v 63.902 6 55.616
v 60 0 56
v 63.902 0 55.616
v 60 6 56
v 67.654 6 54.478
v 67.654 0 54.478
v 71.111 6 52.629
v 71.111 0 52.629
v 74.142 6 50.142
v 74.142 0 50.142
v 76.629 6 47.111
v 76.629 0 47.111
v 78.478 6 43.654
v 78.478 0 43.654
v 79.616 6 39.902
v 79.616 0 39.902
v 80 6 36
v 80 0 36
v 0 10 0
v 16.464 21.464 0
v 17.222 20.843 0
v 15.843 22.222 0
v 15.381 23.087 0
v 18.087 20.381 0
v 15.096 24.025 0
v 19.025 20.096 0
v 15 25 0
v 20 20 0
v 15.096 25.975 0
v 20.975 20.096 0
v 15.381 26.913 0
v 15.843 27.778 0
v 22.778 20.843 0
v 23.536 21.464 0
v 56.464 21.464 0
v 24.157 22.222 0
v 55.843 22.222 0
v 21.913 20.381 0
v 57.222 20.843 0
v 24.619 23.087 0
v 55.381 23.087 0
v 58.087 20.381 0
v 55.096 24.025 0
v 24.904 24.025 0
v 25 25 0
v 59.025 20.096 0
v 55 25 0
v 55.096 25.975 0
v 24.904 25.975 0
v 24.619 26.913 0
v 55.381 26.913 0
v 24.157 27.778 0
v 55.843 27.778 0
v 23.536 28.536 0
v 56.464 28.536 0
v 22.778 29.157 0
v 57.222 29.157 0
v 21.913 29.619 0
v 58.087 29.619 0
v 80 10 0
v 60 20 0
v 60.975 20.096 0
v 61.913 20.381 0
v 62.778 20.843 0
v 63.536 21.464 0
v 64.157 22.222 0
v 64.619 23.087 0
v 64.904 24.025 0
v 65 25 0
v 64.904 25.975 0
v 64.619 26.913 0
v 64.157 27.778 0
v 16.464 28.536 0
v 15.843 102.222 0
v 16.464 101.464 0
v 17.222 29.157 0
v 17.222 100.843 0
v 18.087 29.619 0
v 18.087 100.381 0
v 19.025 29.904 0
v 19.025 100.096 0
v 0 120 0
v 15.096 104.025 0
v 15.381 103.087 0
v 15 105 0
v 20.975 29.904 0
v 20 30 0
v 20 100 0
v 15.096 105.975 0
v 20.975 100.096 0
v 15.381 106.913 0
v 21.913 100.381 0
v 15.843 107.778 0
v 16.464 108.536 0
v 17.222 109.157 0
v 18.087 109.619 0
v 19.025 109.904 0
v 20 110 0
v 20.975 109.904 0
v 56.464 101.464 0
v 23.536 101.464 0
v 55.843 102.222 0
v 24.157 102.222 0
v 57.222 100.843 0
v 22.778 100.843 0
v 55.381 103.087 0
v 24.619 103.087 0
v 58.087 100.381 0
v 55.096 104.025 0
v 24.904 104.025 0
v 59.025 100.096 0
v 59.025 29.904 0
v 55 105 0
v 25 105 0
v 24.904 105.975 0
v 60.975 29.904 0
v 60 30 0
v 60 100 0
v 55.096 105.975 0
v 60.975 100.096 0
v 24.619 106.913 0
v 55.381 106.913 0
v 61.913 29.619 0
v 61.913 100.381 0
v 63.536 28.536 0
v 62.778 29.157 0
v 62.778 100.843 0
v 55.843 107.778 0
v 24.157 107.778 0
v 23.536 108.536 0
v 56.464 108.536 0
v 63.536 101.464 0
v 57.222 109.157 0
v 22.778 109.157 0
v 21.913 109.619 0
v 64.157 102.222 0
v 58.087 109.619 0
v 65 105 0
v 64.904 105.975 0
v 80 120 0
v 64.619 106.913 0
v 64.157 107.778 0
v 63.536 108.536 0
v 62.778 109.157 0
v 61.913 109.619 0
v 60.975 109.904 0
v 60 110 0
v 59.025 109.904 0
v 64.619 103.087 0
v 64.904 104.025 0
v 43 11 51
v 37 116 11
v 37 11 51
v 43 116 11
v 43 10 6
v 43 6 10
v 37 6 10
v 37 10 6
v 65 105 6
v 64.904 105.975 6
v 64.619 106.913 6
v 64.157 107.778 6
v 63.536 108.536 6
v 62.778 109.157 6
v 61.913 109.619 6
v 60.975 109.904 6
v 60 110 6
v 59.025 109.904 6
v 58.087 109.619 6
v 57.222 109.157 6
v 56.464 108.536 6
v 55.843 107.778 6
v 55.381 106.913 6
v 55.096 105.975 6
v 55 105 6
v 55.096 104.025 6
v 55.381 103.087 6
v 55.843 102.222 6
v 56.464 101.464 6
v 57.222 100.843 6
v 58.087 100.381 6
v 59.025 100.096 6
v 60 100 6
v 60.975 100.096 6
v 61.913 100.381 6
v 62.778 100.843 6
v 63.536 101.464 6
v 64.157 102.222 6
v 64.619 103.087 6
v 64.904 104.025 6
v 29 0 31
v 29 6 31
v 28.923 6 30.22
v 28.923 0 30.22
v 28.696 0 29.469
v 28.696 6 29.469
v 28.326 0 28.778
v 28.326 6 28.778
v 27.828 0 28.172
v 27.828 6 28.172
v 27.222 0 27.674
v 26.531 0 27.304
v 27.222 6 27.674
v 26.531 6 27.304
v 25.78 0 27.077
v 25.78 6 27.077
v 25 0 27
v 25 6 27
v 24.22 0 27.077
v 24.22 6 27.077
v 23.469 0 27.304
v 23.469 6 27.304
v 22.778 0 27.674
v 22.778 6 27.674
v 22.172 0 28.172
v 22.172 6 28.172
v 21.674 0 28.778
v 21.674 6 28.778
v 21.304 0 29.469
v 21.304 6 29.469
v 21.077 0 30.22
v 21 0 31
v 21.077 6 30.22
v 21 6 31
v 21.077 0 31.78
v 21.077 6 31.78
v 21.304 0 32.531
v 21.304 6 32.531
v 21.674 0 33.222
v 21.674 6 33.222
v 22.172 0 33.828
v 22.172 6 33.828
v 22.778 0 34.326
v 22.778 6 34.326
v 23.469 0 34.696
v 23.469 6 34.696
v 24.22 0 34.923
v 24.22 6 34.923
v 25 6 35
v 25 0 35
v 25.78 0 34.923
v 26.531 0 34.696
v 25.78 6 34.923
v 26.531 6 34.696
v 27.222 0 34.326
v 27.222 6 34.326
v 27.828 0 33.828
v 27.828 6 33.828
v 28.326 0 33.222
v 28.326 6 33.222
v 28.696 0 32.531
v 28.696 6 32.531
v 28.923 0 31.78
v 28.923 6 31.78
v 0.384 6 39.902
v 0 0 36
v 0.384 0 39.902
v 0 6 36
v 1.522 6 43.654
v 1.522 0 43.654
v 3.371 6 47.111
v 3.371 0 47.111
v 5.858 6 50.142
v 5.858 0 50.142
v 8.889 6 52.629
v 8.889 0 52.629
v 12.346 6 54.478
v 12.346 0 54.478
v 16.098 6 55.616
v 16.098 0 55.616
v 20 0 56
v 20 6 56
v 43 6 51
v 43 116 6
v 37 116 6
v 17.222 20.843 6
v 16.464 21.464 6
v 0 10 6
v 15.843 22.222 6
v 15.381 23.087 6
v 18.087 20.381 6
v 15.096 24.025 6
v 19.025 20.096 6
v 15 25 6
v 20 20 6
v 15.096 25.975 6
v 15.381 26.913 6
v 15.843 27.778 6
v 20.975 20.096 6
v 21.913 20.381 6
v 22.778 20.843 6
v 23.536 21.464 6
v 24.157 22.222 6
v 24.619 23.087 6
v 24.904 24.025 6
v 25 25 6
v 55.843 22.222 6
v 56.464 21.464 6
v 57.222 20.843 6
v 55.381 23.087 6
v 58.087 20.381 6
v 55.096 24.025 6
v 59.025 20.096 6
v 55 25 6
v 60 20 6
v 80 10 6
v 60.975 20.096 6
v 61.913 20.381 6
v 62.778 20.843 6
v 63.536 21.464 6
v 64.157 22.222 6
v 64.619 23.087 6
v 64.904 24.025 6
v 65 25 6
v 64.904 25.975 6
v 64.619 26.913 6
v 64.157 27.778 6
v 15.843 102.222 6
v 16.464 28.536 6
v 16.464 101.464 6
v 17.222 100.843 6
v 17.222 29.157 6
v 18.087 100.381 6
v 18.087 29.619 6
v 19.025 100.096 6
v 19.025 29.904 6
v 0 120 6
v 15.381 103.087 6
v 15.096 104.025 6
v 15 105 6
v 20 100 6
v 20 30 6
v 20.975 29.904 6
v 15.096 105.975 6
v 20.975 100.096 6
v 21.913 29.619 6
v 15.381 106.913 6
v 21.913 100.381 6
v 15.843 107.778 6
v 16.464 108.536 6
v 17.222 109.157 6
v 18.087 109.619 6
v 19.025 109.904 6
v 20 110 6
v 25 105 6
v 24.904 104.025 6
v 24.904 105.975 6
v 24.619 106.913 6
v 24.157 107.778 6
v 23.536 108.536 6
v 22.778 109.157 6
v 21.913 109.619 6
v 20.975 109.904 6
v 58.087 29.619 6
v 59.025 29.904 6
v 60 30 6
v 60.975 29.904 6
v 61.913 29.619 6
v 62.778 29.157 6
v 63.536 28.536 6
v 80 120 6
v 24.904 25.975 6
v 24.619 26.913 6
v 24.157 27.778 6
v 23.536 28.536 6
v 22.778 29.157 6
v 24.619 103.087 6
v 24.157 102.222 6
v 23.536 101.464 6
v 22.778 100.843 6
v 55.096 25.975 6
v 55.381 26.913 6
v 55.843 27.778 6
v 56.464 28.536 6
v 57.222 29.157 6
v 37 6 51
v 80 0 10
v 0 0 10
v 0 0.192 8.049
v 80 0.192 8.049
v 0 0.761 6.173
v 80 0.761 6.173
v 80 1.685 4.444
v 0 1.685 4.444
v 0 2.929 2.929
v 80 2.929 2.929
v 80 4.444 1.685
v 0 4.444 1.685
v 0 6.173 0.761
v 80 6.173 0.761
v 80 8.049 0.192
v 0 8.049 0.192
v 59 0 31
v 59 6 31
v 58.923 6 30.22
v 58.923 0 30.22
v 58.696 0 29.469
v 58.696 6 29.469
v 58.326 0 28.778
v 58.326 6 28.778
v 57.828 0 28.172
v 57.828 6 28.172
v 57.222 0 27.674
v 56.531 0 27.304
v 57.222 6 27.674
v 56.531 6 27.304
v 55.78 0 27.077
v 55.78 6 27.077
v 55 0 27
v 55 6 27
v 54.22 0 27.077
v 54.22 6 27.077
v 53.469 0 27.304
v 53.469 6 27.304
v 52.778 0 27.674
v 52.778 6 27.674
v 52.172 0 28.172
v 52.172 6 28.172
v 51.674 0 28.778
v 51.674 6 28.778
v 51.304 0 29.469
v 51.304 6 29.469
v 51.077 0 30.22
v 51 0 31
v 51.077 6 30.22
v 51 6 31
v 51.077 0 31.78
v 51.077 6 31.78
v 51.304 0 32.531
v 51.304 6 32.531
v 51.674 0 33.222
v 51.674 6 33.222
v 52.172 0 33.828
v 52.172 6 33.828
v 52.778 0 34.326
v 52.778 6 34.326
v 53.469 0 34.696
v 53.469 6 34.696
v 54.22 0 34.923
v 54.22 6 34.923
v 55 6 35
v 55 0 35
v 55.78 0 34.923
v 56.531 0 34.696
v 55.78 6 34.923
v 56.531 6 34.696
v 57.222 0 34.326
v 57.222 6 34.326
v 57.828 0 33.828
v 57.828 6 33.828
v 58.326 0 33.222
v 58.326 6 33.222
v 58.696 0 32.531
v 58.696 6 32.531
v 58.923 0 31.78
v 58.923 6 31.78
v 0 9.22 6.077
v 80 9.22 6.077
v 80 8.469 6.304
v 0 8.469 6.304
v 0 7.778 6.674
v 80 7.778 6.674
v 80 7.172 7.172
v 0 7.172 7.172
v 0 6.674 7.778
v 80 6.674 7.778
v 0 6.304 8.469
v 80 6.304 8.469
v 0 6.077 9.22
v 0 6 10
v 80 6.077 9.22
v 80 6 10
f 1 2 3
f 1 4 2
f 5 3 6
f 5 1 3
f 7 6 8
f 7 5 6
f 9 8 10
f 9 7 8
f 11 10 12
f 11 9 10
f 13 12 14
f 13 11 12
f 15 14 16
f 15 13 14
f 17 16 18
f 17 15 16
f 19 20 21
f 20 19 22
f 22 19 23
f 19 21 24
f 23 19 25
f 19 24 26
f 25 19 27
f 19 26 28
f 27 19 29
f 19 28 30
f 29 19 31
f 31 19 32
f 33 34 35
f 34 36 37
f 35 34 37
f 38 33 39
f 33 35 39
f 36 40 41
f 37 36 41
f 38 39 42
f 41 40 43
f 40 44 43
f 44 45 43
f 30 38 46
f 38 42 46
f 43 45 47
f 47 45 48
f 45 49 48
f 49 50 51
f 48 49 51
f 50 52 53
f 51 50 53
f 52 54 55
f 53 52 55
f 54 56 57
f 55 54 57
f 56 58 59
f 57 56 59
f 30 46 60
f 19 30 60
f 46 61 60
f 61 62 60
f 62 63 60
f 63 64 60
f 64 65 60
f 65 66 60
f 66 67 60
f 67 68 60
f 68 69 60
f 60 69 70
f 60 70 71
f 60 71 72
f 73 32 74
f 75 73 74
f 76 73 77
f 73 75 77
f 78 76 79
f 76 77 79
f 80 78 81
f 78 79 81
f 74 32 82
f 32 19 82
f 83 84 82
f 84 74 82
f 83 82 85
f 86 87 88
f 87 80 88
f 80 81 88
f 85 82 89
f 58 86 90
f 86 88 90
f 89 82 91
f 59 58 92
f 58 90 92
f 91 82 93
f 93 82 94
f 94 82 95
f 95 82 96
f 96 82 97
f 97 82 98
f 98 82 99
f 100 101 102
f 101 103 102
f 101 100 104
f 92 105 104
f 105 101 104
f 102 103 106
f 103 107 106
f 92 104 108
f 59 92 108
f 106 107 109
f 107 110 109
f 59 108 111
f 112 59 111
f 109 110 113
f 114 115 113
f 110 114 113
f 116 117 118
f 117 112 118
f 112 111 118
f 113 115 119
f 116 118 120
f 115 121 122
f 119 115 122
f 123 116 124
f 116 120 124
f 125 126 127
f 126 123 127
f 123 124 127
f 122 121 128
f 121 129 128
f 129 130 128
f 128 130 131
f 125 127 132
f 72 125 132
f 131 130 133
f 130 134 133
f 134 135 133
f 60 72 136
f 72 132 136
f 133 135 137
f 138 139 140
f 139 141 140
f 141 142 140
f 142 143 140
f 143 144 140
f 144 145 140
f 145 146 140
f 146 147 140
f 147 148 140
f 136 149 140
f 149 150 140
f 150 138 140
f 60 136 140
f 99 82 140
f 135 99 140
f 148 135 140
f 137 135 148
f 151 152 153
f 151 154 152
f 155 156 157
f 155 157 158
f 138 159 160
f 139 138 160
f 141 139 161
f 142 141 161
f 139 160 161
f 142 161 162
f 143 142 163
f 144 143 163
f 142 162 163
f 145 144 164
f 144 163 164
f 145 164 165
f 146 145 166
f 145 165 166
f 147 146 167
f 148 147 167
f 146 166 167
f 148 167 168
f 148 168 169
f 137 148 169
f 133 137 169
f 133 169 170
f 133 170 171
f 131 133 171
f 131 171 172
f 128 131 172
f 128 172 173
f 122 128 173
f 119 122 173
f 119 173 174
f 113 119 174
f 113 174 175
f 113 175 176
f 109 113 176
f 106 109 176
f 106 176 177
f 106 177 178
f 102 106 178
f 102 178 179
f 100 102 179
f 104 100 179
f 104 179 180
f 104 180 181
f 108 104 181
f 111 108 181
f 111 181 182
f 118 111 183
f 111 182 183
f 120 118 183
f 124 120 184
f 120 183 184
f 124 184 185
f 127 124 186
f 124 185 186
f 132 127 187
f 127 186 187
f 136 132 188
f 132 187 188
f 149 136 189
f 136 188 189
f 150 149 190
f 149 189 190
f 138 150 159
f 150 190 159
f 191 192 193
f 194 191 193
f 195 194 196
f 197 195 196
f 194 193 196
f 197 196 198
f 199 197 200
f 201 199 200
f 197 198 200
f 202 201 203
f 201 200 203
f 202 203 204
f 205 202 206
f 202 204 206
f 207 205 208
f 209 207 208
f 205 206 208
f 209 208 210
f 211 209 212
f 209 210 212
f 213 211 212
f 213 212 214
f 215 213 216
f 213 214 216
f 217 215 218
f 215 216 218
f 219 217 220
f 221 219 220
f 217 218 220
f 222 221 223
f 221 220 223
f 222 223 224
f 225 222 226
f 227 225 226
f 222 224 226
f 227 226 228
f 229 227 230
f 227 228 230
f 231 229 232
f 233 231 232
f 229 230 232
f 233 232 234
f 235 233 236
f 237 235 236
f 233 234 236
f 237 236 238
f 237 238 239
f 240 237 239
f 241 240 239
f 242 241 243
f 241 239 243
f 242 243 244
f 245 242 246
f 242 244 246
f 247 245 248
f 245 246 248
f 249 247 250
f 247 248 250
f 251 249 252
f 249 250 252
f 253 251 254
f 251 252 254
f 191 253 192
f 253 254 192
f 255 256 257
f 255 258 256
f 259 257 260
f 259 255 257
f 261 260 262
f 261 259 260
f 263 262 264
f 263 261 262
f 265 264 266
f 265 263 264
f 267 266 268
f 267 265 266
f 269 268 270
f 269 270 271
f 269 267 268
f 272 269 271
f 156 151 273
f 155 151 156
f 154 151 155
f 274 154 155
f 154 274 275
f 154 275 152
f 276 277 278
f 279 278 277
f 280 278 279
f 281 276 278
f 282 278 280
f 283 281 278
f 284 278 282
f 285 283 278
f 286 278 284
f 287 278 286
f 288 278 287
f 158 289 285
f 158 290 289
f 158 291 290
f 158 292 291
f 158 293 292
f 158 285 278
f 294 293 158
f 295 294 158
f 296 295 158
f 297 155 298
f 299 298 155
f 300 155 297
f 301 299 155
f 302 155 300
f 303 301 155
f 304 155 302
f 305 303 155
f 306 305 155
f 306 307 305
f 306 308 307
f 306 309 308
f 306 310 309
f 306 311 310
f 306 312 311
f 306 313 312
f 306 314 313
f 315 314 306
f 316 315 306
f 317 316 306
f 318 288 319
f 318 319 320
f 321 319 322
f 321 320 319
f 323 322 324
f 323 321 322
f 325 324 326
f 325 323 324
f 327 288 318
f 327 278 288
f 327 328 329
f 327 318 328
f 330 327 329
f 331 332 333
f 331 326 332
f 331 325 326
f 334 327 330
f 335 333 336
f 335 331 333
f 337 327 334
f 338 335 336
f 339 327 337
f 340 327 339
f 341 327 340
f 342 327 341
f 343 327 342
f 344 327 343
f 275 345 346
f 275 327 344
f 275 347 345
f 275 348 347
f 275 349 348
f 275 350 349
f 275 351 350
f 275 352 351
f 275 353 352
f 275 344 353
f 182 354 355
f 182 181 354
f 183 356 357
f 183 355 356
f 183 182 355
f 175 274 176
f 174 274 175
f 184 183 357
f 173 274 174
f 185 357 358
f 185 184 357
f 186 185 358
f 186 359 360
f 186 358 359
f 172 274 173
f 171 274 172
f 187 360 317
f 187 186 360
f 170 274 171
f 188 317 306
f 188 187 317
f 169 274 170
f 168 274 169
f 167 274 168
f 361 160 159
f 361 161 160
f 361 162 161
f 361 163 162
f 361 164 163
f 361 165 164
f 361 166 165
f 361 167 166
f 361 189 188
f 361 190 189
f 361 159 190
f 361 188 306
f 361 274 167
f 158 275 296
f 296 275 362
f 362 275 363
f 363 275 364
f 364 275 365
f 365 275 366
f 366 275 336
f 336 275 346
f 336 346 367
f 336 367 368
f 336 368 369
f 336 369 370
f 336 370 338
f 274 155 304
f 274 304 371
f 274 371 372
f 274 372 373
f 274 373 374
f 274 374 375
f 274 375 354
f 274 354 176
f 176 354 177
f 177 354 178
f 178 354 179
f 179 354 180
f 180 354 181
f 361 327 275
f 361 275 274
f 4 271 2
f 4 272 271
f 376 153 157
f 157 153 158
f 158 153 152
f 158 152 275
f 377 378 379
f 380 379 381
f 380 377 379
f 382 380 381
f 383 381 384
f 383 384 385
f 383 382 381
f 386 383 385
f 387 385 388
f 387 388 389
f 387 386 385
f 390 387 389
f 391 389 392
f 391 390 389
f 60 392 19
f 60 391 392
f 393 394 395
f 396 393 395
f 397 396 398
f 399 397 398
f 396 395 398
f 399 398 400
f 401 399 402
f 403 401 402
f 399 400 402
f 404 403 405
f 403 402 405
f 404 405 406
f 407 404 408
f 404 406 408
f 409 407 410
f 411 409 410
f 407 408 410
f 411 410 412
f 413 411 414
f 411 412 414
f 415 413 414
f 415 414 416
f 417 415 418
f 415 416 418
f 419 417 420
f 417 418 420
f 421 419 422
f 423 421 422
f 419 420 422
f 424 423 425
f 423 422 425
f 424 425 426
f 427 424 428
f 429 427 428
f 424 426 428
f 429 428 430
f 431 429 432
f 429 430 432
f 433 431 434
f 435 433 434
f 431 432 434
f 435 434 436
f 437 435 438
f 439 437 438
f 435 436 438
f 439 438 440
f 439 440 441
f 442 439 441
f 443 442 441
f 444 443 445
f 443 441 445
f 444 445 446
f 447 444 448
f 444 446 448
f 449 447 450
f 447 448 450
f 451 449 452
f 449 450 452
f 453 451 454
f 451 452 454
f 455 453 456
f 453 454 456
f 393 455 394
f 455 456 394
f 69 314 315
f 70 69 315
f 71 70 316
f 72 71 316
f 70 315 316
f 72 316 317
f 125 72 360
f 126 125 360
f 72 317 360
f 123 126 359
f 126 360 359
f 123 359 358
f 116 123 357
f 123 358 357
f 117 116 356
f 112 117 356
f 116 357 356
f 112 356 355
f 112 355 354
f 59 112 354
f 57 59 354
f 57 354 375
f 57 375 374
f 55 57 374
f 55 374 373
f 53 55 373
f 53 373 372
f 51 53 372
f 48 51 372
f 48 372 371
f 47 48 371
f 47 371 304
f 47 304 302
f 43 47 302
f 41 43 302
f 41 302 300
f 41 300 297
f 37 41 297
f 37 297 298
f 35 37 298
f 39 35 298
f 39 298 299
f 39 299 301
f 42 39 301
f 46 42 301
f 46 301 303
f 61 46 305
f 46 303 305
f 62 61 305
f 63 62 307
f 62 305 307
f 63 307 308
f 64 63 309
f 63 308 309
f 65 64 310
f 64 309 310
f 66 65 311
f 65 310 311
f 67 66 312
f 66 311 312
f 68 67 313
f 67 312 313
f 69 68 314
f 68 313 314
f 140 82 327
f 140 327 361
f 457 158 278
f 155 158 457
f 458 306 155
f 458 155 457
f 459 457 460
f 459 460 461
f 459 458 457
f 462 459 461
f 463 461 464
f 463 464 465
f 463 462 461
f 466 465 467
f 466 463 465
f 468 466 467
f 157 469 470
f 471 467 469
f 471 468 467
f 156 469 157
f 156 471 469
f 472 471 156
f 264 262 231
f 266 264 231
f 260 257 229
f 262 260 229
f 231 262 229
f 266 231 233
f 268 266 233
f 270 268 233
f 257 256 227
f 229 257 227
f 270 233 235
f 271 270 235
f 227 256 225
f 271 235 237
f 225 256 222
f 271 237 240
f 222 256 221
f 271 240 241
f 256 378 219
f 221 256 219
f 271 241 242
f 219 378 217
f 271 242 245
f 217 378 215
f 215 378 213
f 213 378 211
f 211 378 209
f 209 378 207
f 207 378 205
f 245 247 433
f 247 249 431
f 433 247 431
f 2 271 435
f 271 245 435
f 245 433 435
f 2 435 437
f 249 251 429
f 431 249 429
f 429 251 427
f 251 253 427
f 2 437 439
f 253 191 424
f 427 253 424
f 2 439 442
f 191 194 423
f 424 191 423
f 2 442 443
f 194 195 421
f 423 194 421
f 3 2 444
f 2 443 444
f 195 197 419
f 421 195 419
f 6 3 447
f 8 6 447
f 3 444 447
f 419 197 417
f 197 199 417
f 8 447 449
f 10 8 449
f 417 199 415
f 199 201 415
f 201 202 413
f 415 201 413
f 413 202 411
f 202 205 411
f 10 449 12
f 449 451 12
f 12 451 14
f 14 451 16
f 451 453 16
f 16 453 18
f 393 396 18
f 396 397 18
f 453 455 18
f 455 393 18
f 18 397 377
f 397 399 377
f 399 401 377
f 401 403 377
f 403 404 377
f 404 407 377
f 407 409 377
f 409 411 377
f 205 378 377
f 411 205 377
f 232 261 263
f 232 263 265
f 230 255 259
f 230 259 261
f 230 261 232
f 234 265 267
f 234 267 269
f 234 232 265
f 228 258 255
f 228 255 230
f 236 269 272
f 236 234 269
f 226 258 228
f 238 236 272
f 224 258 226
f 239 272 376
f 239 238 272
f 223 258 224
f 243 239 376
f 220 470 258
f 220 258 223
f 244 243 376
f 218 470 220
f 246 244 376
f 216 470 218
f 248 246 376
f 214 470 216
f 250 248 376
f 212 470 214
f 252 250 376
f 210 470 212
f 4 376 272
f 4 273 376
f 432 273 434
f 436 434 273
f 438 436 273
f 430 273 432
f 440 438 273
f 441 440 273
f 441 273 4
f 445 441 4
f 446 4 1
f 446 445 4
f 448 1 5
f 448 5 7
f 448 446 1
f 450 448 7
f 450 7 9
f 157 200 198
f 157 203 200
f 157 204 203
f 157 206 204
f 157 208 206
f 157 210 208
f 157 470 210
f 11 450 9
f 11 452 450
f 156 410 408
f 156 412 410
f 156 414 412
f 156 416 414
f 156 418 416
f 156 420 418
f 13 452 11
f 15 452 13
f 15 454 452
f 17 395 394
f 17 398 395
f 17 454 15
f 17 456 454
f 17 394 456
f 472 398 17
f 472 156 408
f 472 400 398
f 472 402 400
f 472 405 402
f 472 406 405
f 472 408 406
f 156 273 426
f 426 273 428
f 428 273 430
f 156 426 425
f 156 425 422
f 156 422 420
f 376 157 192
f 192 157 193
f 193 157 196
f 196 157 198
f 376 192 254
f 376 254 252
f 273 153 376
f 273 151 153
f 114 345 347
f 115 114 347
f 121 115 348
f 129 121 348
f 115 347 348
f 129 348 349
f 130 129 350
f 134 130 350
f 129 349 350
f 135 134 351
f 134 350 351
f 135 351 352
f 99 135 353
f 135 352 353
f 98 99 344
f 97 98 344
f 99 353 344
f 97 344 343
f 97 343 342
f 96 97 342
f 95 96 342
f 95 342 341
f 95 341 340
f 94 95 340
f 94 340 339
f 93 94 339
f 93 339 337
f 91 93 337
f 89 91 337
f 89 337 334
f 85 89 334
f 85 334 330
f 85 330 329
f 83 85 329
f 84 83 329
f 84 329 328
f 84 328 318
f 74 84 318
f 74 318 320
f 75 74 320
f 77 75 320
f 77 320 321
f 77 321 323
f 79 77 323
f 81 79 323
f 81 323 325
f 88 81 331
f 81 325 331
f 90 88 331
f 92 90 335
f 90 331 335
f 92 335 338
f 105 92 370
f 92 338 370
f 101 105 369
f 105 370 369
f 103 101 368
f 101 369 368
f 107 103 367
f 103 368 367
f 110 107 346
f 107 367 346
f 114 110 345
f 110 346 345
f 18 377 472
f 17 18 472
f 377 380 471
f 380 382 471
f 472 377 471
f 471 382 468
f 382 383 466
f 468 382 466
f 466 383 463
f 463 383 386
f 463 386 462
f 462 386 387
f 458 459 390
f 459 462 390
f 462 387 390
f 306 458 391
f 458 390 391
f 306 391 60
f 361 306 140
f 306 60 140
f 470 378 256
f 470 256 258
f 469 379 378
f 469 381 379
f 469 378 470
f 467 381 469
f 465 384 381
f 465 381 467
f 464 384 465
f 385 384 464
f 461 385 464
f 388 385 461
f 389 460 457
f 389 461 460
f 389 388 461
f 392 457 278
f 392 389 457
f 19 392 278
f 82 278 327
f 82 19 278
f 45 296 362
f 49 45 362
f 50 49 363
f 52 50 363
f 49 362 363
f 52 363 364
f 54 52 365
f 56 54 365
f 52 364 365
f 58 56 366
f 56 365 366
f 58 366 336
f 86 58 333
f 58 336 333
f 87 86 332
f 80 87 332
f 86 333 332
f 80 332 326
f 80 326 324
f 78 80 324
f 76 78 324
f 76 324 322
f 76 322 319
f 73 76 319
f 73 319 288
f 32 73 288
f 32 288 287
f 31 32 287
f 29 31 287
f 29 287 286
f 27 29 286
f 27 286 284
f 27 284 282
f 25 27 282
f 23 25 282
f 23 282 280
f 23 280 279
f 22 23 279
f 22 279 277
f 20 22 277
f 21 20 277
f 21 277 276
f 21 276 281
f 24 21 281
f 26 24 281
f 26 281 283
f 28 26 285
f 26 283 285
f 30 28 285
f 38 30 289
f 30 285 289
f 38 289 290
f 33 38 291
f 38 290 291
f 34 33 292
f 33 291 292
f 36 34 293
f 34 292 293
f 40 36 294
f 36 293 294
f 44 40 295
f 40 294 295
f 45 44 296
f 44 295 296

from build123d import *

# Parameters (mm, degrees)
SKETCH_1_W          = 80
SKETCH_1_H          = 120
EXTRUDE_1_DEPTH     = 6
SKETCH_2_W          = 80
SKETCH_2_H          = 6
EXTRUDE_2_DEPTH     = 50
FILLET_1_R          = 4
FILLET_2_R          = 10
CUT_EXTRUDE_1_REACH = 8
SKETCH_3_R          = 5
EXTRUDE_3_DEPTH     = 3
SKETCH_5_R          = 4
CUT_EXTRUDE_2_DEPTH = 6
FILLET_3_R          = 20


with BuildPart() as part:
    # 草图1 → 凸台-拉伸1 (new body)
    with BuildSketch(Plane.XY):
        with Locations((40, 60)):
            Rectangle(SKETCH_1_W, SKETCH_1_H)
    extrude(amount=EXTRUDE_1_DEPTH)

    # 草图2 → 凸台-拉伸2 (add)
    with BuildSketch(Plane.XY.offset(6)):
        with Locations((40, 3)):
            Rectangle(SKETCH_2_W, SKETCH_2_H)
    extrude(amount=EXTRUDE_2_DEPTH)

    # 圆角1
    fillet_1_edges = [part.edges().sort_by_distance(p)[0] for p in [
        (40, 6, 6),
    ]]
    fillet(fillet_1_edges, radius=FILLET_1_R)

    # 圆角2
    fillet_2_edges = [part.edges().sort_by_distance(p)[0] for p in [
        (40, 0, 0),
    ]]
    fillet(fillet_2_edges, radius=FILLET_2_R)

    # 草图3 → 切除-拉伸1 (cut, up to next)
    with BuildSketch(Plane.XY.offset(6), mode=Mode.PRIVATE) as cut_extrude_1_sk1:
        with Locations((60, 105)):
            Circle(SKETCH_3_R)
    cut_extrude_1_tool1 = extrude(cut_extrude_1_sk1.sketch, amount=-CUT_EXTRUDE_1_REACH, mode=Mode.PRIVATE) & part.part
    add(cut_extrude_1_tool1.solids().sort_by_distance((60, 105, 6))[0], mode=Mode.SUBTRACT)
    # 草图3 → 切除-拉伸1 (cut, up to next)
    with BuildSketch(Plane.XY.offset(6), mode=Mode.PRIVATE) as cut_extrude_1_sk2:
        with Locations((20, 105)):
            Circle(SKETCH_3_R)
    cut_extrude_1_tool2 = extrude(cut_extrude_1_sk2.sketch, amount=-CUT_EXTRUDE_1_REACH, mode=Mode.PRIVATE) & part.part
    add(cut_extrude_1_tool2.solids().sort_by_distance((20, 105, 6))[0], mode=Mode.SUBTRACT)
    # 草图3 → 切除-拉伸1 (cut, up to next)
    with BuildSketch(Plane.XY.offset(6), mode=Mode.PRIVATE) as cut_extrude_1_sk3:
        with Locations((20, 25)):
            Circle(SKETCH_3_R)
    cut_extrude_1_tool3 = extrude(cut_extrude_1_sk3.sketch, amount=-CUT_EXTRUDE_1_REACH, mode=Mode.PRIVATE) & part.part
    add(cut_extrude_1_tool3.solids().sort_by_distance((20, 25, 6))[0], mode=Mode.SUBTRACT)
    # 草图3 → 切除-拉伸1 (cut, up to next)
    with BuildSketch(Plane.XY.offset(6), mode=Mode.PRIVATE) as cut_extrude_1_sk4:
        with Locations((60, 25)):
            Circle(SKETCH_3_R)
    cut_extrude_1_tool4 = extrude(cut_extrude_1_sk4.sketch, amount=-CUT_EXTRUDE_1_REACH, mode=Mode.PRIVATE) & part.part
    add(cut_extrude_1_tool4.solids().sort_by_distance((60, 25, 6))[0], mode=Mode.SUBTRACT)

    # 草图4 → 凸台-拉伸3 (add, symmetric)
    with BuildSketch(Plane(origin=(40, 0, 0), x_dir=(0, 0, -1), z_dir=(1, 0, 0))):
        Polygon((-51, 6), (-10, 6), (-6, 10), (-6, 116), (-11, 116), (-51, 11), align=None)
    extrude(amount=EXTRUDE_3_DEPTH, both=True)

    # 草图5 → 切除-拉伸2 (cut)
    with BuildSketch(Plane(origin=(0, 6, 0), x_dir=(1, 0, 0), z_dir=(0, 1, 0))):
        with Locations((25, -31)):
            Circle(SKETCH_5_R)
        with Locations((55, -31)):
            Circle(SKETCH_5_R)
    extrude(amount=-CUT_EXTRUDE_2_DEPTH, mode=Mode.SUBTRACT)

    # 圆角3
    fillet_3_edges = [part.edges().sort_by_distance(p)[0] for p in [
        (0, 3, 56),
        (80, 3, 56),
    ]]
    fillet(fillet_3_edges, radius=FILLET_3_R)


solid = part.part
